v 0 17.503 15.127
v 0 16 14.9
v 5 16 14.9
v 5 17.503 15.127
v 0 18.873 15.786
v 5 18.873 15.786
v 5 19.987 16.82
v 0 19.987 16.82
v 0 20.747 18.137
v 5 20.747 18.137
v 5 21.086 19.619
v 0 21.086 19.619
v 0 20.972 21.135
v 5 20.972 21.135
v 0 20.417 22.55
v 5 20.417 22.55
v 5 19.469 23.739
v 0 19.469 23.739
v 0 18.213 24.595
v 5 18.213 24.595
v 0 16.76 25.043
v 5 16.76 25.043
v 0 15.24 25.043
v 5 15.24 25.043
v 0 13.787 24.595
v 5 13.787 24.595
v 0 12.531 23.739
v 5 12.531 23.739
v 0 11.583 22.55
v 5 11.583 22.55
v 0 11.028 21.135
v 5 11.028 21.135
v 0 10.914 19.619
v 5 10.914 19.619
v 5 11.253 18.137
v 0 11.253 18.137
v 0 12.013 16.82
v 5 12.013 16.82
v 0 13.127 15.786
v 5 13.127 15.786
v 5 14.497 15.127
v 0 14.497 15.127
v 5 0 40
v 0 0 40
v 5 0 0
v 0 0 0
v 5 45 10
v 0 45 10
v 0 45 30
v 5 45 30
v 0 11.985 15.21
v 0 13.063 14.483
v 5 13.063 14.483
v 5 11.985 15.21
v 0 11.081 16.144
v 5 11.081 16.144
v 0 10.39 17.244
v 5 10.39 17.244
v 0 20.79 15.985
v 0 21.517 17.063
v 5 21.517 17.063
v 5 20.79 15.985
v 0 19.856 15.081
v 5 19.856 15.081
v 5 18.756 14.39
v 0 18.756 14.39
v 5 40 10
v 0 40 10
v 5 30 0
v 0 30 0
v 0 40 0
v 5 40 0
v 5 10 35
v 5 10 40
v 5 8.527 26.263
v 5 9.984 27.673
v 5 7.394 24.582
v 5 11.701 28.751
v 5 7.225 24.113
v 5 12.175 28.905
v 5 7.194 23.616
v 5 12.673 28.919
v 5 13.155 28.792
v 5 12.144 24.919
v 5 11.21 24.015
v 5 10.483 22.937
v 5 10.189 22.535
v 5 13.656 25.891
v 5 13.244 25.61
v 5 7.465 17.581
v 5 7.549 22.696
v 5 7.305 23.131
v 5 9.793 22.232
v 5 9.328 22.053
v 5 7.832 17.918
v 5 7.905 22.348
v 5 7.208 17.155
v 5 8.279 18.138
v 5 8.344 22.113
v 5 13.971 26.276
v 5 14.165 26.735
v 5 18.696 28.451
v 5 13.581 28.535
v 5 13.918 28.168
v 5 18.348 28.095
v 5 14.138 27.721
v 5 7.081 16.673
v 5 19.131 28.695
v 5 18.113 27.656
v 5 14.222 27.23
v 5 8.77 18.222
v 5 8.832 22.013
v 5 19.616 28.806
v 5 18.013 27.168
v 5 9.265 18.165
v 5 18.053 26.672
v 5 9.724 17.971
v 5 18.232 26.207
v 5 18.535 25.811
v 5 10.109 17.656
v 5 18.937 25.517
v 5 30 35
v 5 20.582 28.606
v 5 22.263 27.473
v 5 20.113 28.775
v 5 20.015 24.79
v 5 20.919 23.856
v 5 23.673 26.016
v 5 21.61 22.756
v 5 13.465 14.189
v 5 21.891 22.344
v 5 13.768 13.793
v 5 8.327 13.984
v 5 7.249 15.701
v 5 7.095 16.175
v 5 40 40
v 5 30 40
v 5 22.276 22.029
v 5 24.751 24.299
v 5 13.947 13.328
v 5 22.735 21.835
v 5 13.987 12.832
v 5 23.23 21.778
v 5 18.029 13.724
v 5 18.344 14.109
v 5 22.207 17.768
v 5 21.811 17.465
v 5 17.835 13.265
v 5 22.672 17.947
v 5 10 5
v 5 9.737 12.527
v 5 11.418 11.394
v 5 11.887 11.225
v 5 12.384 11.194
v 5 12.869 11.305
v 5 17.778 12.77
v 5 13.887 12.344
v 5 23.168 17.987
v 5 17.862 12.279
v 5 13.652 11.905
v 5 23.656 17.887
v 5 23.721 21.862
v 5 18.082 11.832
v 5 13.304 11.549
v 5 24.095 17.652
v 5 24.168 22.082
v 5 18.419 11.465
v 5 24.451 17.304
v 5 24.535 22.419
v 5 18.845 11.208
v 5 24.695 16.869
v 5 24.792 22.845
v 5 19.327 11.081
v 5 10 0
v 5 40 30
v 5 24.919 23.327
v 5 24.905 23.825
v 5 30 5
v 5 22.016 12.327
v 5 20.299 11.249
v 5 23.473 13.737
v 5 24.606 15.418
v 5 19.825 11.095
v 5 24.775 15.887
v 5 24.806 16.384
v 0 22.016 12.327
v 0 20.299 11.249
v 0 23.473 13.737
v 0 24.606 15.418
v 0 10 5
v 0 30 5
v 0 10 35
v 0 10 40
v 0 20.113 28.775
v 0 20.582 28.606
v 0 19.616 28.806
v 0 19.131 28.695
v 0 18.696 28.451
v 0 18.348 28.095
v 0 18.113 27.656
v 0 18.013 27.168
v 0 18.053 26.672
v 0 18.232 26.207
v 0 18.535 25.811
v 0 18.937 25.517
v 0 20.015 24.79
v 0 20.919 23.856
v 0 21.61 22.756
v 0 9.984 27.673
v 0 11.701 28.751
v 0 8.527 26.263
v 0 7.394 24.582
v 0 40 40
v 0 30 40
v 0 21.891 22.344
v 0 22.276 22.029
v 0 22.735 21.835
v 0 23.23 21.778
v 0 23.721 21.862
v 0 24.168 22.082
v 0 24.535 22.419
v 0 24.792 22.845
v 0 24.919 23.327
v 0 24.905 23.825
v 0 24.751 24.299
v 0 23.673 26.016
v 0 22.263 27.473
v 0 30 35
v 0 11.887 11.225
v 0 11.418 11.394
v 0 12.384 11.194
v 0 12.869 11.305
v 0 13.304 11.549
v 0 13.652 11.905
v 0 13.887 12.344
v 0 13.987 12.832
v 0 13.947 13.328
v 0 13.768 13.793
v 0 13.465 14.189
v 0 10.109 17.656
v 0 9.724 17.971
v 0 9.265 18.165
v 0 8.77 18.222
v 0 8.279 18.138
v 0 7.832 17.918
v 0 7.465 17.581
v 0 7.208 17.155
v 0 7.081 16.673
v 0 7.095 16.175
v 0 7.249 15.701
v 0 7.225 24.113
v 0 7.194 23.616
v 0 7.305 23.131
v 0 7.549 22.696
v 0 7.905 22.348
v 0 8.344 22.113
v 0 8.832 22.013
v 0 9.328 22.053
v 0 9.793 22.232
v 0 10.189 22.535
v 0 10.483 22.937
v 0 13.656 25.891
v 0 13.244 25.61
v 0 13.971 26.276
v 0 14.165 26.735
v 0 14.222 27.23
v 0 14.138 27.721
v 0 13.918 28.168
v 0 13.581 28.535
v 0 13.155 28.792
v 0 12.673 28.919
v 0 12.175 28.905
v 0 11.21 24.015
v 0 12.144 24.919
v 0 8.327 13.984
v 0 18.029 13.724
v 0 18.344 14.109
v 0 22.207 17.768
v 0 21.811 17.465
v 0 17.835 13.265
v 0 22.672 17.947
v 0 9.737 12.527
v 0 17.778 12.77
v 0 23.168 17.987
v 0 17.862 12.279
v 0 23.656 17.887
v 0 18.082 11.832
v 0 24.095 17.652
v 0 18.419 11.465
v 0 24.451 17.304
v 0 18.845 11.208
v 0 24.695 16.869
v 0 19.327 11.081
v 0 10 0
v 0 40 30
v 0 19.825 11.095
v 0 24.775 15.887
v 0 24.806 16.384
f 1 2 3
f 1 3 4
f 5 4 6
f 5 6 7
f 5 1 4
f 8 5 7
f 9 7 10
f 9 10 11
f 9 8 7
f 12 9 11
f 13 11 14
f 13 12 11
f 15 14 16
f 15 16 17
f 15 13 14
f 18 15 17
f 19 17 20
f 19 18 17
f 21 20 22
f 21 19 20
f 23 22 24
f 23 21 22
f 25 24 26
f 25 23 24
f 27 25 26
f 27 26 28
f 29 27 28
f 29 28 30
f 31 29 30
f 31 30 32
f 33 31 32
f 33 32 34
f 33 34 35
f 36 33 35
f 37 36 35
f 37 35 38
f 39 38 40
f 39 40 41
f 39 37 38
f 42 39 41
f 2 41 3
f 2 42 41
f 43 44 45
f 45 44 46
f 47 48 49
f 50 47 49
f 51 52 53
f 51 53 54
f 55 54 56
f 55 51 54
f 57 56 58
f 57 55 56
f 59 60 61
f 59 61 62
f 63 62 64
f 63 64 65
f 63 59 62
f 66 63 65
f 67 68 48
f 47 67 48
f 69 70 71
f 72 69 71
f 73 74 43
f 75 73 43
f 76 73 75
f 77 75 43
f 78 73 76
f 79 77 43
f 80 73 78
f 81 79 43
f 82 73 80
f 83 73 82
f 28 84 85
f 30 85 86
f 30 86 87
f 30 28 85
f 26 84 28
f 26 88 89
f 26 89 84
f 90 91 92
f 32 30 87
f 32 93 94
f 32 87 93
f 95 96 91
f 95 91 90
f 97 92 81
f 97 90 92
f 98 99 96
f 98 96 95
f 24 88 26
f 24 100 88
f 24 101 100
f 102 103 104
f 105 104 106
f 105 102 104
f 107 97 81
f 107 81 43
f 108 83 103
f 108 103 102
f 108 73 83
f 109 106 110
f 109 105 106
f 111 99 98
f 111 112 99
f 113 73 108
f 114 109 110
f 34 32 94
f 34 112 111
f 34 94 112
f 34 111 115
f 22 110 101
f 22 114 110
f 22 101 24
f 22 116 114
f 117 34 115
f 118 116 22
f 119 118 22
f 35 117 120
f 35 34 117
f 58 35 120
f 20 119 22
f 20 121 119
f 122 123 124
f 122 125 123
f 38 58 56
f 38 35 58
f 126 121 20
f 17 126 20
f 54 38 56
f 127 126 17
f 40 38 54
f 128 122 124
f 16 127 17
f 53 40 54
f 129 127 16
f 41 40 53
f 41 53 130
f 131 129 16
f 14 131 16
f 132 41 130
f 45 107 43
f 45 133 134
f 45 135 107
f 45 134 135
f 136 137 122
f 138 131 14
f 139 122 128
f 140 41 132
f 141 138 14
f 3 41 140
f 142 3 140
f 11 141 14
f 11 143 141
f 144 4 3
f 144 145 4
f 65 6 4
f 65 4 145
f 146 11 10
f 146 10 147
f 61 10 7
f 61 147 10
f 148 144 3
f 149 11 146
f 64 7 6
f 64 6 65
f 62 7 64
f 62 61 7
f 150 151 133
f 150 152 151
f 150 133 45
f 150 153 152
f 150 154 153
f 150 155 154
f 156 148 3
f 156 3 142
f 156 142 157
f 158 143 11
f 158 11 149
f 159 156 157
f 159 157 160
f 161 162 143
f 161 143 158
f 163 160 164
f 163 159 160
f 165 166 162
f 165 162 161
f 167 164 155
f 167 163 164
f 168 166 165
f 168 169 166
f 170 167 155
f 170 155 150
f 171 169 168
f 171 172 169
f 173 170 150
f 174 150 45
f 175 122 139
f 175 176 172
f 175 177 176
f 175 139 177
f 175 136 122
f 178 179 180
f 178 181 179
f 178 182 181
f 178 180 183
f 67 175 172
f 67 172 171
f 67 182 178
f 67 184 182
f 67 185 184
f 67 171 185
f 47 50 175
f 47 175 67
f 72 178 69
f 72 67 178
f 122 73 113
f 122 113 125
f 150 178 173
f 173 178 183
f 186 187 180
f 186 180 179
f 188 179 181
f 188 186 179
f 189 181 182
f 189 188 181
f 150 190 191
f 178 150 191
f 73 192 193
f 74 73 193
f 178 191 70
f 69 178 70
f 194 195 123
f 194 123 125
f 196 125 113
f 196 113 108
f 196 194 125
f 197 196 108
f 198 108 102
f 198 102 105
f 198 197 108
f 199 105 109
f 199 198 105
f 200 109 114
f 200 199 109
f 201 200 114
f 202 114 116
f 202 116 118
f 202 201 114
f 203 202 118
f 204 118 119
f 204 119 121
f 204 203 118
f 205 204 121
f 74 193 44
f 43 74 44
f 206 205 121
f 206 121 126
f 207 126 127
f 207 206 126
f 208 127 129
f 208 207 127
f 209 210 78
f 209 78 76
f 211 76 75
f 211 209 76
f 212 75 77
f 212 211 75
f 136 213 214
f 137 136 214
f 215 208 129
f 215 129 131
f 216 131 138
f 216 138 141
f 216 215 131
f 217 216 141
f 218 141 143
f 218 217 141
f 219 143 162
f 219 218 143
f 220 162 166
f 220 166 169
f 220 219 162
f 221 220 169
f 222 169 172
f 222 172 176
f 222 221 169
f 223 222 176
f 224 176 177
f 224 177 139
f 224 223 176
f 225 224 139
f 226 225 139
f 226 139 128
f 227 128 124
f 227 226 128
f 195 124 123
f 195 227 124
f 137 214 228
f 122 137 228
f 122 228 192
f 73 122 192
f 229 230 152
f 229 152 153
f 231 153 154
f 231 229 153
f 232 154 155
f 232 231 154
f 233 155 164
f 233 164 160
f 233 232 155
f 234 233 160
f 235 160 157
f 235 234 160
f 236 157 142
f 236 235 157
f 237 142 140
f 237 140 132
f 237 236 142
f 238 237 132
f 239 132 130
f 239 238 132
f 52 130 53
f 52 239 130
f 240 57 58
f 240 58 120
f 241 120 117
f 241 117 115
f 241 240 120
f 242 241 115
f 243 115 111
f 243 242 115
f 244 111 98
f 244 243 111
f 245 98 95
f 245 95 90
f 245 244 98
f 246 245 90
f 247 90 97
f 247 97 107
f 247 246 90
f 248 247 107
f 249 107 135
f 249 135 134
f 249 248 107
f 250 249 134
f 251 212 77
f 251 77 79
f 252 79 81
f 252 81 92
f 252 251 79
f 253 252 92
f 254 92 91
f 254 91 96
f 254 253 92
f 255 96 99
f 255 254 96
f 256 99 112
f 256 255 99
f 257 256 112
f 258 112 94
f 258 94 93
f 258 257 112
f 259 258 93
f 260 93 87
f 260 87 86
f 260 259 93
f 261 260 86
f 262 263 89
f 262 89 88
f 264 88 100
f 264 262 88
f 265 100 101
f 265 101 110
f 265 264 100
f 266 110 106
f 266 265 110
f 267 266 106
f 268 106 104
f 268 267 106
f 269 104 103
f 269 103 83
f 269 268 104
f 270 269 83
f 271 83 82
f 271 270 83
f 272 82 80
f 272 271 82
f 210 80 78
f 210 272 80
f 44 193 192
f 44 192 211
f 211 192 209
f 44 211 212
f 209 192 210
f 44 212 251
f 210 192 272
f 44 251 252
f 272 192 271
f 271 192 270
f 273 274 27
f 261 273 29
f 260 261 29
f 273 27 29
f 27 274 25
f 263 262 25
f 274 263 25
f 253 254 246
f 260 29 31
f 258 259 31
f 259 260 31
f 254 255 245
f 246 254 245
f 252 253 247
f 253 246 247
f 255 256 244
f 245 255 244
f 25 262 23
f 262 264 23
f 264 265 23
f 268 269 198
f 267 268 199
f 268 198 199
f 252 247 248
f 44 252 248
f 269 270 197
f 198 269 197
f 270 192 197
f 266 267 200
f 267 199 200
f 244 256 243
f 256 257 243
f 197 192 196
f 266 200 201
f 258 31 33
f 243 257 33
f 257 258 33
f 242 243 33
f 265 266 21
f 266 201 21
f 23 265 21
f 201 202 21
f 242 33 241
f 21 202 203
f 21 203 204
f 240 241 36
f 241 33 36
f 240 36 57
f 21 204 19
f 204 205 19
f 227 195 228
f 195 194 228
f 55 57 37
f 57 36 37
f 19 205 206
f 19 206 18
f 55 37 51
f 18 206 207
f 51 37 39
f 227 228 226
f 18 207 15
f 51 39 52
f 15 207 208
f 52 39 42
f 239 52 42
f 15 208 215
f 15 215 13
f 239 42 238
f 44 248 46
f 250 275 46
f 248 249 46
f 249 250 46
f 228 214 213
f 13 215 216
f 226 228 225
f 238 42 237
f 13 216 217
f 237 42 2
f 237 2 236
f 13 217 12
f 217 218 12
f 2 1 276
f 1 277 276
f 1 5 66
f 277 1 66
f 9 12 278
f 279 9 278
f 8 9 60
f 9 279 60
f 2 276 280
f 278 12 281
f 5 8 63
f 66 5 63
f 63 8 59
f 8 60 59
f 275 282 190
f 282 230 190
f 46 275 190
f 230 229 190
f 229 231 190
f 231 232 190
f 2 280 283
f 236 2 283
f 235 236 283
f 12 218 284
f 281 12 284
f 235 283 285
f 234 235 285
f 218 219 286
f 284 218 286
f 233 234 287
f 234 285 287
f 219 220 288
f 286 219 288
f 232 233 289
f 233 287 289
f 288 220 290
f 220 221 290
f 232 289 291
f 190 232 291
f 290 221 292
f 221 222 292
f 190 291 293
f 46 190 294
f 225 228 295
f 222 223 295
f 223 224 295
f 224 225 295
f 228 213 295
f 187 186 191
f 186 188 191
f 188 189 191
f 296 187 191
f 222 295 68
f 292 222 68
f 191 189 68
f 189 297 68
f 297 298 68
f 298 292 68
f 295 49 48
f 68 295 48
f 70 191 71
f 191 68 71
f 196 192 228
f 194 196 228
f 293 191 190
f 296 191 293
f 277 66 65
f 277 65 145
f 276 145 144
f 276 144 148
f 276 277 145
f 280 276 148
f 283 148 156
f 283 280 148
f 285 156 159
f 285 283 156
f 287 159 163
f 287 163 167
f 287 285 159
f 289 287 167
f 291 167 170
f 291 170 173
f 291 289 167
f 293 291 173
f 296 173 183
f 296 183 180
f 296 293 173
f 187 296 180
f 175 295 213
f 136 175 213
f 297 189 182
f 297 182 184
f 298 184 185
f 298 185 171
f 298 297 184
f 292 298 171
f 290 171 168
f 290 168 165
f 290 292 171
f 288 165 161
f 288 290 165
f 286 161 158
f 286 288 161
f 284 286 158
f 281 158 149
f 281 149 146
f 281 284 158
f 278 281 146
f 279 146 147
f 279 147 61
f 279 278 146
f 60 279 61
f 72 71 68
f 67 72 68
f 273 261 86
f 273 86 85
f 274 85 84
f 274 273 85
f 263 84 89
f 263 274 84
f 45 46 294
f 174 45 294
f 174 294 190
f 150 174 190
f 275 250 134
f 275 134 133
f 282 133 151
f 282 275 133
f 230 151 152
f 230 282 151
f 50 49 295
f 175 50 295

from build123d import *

# Parameters (mm, degrees)
SKETCH_1_R      = 5.1
EXTRUDE_1_DEPTH = 5


with BuildPart() as part:
    # 草图1 → 凸台-拉伸1 (new body)
    with BuildSketch(Plane(origin=(0, 0, 0), x_dir=(0, 0, -1), z_dir=(1, 0, 0))):
        Polygon((-30, 40), (-40, 40), (-40, 30), (-35, 30), (-35, 10), (-40, 10), (-40, 0), (0, 0), (0, 10), (-5, 10), (-5, 30), (0, 30), (0, 40), (-10, 40), (-10, 45), (-30, 45), align=None)
        with Locations((-20, 16)):
            Circle(SKETCH_1_R, mode=Mode.SUBTRACT)
        with BuildLine():
            ThreePointArc((-24.298590679, 24.751263804), (-26.780876657, 23.005869808), (-28.606339093, 20.58185851))
            ThreePointArc((-28.606339093, 20.58185851), (-27.883996425, 18.21474612), (-25.516884034, 18.937088789))
            ThreePointArc((-25.516884034, 18.937088789), (-24.346715806, 20.490942184), (-22.755506846, 21.60978449))
            ThreePointArc((-22.755506846, 21.60978449), (-21.956309105, 23.952066064), (-24.298590679, 24.751263804))
        make_face(mode=Mode.SUBTRACT)
        with BuildLine():
            ThreePointArc((-11.248736196, 20.298590679), (-12.994130192, 22.780876657), (-15.41814149, 24.606339093))
            ThreePointArc((-15.41814149, 24.606339093), (-17.78525388, 23.883996425), (-17.062911211, 21.516884034))
            ThreePointArc((-17.062911211, 21.516884034), (-15.509057816, 20.346715806), (-14.39021551, 18.755506846))
            ThreePointArc((-14.39021551, 18.755506846), (-12.047933936, 17.956309105), (-11.248736196, 20.298590679))
        make_face(mode=Mode.SUBTRACT)
        with BuildLine():
            ThreePointArc((-15.701409321, 7.248736196), (-13.219123343, 8.994130192), (-11.393660907, 11.41814149))
            ThreePointArc((-11.393660907, 11.41814149), (-12.116003575, 13.78525388), (-14.483115966, 13.062911211))
            ThreePointArc((-14.483115966, 13.062911211), (-15.653284194, 11.509057816), (-17.244493154, 10.39021551))
            ThreePointArc((-17.244493154, 10.39021551), (-18.043690895, 8.047933936), (-15.701409321, 7.248736196))
        make_face(mode=Mode.SUBTRACT)
        with BuildLine():
            ThreePointArc((-28.751263804, 11.701409321), (-27.005869808, 9.219123343), (-24.58185851, 7.393660907))
            ThreePointArc((-24.58185851, 7.393660907), (-22.21474612, 8.116003575), (-22.937088789, 10.483115966))
            ThreePointArc((-22.937088789, 10.483115966), (-24.490942184, 11.653284194), (-25.60978449, 13.244493154))
            ThreePointArc((-25.60978449, 13.244493154), (-27.952066064, 14.043690895), (-28.751263804, 11.701409321))
        make_face(mode=Mode.SUBTRACT)
    extrude(amount=EXTRUDE_1_DEPTH)


solid = part.part
